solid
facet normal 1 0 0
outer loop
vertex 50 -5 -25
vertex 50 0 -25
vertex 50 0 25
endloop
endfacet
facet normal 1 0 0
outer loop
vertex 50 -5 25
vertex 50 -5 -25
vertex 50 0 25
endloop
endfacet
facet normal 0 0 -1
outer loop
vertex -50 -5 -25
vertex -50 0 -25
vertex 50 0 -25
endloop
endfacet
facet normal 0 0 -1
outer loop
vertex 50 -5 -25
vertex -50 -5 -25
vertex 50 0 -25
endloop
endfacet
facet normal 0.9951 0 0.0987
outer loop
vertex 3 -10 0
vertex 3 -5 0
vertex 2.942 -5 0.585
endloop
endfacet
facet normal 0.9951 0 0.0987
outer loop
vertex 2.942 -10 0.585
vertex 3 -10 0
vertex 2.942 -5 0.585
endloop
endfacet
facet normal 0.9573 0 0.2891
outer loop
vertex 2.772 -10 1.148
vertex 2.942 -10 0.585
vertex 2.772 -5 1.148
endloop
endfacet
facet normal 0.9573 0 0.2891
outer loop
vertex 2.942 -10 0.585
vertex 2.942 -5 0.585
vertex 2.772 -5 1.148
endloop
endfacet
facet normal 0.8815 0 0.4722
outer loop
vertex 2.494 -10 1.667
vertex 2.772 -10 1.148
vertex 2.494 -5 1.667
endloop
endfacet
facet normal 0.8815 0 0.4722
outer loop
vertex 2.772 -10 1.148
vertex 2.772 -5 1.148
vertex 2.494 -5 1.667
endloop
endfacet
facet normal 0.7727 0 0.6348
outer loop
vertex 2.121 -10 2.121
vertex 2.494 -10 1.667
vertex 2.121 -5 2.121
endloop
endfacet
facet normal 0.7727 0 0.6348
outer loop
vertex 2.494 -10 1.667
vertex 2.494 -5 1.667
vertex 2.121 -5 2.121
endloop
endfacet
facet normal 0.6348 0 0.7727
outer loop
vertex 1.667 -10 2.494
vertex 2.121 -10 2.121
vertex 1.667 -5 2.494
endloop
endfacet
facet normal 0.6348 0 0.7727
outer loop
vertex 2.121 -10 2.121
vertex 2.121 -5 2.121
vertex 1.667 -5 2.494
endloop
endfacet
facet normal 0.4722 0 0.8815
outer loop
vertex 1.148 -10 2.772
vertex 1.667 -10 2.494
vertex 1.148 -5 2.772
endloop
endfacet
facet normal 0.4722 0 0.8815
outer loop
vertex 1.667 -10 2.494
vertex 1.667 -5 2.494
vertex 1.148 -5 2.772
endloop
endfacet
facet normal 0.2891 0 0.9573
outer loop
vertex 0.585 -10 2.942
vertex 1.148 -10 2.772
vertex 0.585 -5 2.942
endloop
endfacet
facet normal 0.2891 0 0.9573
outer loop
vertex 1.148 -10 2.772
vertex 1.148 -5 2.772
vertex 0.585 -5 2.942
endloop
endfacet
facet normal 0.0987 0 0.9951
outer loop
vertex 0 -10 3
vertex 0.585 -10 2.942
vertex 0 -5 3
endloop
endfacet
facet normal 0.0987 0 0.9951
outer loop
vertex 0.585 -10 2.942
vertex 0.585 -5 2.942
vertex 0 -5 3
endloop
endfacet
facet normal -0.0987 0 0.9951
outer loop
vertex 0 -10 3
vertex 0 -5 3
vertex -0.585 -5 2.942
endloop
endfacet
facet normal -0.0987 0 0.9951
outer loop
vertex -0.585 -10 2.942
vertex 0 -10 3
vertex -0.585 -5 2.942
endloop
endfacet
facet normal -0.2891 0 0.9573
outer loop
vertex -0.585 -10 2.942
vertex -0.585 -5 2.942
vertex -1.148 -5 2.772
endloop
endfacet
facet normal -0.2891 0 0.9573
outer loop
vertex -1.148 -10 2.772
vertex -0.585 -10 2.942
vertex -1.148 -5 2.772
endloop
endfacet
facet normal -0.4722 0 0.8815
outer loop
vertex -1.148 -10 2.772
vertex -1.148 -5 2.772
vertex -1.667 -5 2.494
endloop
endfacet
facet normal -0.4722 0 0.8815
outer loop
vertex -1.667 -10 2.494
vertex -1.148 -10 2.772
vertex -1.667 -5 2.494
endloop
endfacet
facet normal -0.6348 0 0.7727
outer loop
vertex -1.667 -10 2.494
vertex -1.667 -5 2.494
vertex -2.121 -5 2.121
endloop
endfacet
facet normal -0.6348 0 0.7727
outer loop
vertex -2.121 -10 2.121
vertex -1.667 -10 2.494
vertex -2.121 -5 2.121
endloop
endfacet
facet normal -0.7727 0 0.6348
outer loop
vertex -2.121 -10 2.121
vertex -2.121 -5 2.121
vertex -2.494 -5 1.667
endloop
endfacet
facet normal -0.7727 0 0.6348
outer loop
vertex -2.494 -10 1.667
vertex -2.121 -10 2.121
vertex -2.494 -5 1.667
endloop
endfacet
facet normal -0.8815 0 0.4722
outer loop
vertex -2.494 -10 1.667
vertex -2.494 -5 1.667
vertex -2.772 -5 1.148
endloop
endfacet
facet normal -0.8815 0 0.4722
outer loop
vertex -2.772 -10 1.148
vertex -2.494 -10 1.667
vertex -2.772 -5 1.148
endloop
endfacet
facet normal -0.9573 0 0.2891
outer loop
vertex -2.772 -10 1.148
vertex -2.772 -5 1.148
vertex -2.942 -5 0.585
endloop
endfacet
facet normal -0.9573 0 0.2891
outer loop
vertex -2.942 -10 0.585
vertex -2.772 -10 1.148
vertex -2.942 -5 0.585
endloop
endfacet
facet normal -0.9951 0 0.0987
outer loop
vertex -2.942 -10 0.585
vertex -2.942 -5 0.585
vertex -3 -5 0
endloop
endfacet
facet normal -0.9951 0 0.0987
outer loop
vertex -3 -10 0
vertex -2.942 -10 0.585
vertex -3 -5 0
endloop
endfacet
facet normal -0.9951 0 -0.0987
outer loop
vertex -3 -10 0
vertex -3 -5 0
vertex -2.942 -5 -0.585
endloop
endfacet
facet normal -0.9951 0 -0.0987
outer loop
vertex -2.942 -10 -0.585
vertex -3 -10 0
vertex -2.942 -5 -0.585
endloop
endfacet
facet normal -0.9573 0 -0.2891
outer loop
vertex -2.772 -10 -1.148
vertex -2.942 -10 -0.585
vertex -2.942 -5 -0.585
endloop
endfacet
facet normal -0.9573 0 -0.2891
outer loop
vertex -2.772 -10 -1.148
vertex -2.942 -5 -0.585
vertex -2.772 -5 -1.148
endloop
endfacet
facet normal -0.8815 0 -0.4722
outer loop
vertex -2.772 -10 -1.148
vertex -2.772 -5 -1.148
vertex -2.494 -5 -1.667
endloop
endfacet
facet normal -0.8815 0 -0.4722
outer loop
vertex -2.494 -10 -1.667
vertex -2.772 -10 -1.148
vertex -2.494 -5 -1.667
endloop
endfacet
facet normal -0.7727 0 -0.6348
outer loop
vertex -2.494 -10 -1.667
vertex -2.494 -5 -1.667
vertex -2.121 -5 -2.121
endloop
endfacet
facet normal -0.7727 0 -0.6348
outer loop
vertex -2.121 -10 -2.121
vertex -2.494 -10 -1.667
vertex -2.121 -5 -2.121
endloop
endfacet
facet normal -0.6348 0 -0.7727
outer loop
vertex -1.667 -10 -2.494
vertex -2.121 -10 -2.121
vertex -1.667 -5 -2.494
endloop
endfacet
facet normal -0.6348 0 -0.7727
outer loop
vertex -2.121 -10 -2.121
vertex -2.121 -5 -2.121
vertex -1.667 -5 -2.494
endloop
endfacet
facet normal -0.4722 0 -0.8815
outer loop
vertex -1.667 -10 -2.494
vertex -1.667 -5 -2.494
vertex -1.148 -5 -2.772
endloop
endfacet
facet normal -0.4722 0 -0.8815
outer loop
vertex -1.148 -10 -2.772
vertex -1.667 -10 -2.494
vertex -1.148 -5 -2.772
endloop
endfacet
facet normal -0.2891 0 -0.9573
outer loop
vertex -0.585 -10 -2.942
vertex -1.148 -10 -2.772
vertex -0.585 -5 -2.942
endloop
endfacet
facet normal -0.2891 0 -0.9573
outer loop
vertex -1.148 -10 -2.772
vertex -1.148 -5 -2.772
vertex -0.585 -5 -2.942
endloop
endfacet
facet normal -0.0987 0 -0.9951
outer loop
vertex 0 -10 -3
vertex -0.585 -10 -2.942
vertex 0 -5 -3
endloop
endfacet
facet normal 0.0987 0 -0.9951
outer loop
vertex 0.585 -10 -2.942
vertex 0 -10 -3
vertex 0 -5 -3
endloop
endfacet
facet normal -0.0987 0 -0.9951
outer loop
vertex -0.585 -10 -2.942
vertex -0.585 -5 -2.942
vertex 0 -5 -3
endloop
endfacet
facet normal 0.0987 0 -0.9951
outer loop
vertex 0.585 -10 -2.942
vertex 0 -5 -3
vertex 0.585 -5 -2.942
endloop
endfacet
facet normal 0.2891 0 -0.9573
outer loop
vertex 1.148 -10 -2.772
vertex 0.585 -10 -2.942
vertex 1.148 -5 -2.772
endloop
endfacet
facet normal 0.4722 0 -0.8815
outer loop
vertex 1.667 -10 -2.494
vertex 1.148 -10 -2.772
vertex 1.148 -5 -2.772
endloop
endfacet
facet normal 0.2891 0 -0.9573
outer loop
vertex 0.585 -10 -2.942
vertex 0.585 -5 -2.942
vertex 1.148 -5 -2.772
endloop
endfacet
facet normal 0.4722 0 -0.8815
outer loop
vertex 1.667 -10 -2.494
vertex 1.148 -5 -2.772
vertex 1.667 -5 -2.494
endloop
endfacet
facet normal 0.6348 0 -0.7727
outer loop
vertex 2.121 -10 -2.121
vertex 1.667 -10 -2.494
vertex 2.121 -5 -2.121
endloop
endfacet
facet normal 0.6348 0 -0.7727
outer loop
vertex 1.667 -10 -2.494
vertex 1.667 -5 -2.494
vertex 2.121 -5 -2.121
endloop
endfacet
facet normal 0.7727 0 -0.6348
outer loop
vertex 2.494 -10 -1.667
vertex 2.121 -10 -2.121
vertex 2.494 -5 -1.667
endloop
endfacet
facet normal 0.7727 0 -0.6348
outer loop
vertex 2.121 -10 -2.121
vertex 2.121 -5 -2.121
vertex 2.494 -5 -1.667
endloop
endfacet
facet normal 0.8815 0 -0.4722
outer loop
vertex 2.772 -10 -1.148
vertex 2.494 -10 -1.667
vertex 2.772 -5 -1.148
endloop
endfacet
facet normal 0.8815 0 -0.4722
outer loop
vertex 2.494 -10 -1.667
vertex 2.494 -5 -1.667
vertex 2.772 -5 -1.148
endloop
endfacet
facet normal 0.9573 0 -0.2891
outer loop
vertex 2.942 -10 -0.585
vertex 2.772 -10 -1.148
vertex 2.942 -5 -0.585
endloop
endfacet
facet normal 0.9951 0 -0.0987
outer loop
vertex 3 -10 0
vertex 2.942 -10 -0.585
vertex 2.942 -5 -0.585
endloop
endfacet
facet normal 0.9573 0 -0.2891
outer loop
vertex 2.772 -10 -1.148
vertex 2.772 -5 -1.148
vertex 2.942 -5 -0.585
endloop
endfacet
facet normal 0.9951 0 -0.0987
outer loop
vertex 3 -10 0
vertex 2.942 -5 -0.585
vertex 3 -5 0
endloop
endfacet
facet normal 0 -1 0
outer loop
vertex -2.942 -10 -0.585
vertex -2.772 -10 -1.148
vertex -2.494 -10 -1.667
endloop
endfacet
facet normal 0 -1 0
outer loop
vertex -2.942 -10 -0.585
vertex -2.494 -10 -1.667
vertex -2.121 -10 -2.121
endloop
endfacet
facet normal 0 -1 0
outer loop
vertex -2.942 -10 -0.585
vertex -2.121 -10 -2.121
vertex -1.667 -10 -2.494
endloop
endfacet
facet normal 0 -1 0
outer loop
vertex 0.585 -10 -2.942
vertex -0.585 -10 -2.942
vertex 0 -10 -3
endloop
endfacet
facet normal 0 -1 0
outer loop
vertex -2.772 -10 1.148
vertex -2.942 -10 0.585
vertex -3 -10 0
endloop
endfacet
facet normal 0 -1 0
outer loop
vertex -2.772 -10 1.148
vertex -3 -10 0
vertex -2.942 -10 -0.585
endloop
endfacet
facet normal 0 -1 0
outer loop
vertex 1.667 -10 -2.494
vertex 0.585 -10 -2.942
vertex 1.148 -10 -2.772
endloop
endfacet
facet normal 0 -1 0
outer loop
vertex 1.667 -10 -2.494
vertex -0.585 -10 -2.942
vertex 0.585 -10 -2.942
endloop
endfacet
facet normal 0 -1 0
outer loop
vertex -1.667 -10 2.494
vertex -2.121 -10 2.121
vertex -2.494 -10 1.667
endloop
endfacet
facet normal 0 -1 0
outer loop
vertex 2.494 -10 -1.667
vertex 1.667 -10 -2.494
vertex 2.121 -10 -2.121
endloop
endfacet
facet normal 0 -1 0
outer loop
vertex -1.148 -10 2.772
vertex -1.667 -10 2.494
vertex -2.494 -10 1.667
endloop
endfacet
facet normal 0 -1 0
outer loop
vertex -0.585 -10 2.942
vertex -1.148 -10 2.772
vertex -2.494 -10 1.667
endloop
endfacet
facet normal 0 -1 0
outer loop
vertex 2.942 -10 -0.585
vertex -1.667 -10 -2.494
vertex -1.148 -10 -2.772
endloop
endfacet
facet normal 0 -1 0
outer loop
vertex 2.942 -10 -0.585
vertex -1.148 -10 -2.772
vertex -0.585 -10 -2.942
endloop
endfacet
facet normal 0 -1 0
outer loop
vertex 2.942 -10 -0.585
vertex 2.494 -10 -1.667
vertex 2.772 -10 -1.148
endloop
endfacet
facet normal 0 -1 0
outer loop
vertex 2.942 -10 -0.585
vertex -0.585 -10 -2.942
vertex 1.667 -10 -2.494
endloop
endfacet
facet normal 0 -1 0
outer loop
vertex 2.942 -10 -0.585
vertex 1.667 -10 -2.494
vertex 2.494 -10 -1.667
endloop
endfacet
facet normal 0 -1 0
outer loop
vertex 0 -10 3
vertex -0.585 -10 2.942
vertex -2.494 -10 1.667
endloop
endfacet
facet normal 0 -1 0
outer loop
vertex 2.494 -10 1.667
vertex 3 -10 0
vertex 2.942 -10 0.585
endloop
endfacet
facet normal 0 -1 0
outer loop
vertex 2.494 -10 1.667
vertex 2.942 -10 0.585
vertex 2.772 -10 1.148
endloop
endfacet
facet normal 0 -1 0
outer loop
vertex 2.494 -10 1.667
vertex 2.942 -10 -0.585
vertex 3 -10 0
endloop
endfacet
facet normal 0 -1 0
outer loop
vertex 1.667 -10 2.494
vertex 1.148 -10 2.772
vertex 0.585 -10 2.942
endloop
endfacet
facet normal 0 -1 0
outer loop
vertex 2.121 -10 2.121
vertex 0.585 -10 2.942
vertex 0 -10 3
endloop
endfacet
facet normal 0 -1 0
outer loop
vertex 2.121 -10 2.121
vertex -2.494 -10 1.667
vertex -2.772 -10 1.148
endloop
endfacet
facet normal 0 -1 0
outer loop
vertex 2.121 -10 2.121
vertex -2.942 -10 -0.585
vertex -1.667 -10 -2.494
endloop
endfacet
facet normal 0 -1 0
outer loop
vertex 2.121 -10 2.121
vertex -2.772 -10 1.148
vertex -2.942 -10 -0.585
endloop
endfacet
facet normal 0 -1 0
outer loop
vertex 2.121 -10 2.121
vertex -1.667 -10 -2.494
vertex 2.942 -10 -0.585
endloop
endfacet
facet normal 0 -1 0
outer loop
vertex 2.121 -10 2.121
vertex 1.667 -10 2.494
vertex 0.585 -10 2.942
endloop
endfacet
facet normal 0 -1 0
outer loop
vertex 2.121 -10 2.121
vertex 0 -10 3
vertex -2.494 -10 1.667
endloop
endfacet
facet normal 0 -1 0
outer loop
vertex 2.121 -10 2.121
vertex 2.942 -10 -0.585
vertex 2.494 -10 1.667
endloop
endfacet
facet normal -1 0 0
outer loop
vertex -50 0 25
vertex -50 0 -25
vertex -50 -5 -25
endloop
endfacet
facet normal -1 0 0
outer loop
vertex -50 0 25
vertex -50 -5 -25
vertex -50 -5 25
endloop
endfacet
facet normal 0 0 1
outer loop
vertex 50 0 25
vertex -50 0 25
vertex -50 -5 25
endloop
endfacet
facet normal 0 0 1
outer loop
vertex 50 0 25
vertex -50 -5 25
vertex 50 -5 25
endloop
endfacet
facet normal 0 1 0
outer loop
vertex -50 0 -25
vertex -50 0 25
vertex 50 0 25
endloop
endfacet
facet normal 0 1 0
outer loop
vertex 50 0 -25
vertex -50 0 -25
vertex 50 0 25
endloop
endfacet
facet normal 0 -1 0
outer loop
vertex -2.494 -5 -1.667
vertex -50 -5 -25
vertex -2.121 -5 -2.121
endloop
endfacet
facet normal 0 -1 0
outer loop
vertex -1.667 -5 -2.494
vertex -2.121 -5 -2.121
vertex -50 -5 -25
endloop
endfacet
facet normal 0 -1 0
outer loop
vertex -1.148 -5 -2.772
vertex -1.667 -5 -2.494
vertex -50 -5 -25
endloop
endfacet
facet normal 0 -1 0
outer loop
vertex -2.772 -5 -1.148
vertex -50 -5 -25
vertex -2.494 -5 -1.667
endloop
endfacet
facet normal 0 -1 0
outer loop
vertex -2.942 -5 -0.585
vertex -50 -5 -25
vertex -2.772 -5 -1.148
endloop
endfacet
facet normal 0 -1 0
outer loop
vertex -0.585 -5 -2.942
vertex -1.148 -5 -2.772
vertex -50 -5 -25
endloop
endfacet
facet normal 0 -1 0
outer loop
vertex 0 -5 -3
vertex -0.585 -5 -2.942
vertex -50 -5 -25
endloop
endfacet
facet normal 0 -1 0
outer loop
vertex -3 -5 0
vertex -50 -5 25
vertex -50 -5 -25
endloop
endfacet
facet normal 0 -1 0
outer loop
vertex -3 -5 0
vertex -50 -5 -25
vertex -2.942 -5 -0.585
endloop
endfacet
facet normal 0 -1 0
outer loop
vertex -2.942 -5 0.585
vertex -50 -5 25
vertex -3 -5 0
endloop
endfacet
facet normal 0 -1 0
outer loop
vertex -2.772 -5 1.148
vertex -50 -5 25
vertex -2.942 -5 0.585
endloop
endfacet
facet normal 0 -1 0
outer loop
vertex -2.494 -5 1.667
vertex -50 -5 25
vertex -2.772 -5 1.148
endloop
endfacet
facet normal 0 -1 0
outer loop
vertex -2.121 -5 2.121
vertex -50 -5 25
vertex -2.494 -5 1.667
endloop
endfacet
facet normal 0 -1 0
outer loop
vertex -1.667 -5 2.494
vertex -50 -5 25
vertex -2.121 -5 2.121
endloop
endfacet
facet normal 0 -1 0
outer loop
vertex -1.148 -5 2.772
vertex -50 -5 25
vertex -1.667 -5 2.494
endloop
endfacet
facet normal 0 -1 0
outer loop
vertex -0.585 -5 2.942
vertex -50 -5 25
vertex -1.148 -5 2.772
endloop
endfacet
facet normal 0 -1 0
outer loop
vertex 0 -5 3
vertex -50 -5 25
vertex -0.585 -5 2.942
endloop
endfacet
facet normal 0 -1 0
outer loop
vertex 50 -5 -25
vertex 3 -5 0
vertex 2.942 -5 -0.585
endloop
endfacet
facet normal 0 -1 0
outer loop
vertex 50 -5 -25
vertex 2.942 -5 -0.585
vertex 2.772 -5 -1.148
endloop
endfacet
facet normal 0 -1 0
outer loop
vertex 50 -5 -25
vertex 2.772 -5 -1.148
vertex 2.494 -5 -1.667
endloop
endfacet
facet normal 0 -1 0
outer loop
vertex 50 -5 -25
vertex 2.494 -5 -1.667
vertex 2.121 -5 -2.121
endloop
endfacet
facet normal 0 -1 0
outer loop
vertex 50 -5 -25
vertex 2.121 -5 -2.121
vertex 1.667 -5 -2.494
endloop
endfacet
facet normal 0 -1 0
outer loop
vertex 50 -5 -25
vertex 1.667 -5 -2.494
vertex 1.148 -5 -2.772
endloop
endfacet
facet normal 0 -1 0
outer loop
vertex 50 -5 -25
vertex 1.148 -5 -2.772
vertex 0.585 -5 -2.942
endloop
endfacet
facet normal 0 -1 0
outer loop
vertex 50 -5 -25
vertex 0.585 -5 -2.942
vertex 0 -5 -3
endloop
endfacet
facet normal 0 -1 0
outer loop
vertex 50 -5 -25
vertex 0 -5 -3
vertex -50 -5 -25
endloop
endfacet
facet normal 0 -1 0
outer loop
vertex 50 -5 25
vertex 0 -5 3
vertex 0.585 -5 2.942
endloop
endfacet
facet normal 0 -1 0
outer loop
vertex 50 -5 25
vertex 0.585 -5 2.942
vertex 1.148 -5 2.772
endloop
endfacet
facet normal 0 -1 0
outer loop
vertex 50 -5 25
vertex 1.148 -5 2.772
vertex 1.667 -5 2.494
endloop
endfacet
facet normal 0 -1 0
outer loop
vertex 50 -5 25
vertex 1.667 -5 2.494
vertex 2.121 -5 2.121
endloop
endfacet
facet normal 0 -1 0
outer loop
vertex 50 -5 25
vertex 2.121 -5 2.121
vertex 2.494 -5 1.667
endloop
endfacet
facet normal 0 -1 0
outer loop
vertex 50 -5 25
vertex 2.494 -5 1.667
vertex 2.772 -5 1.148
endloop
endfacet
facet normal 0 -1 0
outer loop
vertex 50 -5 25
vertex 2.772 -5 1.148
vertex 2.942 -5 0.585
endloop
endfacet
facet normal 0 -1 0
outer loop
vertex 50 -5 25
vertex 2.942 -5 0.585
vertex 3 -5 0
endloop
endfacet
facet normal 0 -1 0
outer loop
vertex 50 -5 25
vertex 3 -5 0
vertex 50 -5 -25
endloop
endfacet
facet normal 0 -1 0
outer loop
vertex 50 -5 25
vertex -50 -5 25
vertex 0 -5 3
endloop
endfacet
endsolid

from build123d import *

# Parameters (mm, degrees)
F0_W     = 100
F0_H     = 50
F0_R     = 3
F1_DEPTH = 5
F2_DEPTH = 10


with BuildPart() as f1:
    # F0 (on Front) → F1 (new body)
    with BuildSketch(Plane.XZ):
        Rectangle(F0_W, F0_H)
        Circle(F0_R, mode=Mode.SUBTRACT)
        Circle(F0_R)
    extrude(amount=F1_DEPTH)

    # F0 (on Front) → F2 (join)
    with BuildSketch(Plane.XZ):
        Circle(F0_R)
    extrude(amount=F2_DEPTH)


solid = f1.part
